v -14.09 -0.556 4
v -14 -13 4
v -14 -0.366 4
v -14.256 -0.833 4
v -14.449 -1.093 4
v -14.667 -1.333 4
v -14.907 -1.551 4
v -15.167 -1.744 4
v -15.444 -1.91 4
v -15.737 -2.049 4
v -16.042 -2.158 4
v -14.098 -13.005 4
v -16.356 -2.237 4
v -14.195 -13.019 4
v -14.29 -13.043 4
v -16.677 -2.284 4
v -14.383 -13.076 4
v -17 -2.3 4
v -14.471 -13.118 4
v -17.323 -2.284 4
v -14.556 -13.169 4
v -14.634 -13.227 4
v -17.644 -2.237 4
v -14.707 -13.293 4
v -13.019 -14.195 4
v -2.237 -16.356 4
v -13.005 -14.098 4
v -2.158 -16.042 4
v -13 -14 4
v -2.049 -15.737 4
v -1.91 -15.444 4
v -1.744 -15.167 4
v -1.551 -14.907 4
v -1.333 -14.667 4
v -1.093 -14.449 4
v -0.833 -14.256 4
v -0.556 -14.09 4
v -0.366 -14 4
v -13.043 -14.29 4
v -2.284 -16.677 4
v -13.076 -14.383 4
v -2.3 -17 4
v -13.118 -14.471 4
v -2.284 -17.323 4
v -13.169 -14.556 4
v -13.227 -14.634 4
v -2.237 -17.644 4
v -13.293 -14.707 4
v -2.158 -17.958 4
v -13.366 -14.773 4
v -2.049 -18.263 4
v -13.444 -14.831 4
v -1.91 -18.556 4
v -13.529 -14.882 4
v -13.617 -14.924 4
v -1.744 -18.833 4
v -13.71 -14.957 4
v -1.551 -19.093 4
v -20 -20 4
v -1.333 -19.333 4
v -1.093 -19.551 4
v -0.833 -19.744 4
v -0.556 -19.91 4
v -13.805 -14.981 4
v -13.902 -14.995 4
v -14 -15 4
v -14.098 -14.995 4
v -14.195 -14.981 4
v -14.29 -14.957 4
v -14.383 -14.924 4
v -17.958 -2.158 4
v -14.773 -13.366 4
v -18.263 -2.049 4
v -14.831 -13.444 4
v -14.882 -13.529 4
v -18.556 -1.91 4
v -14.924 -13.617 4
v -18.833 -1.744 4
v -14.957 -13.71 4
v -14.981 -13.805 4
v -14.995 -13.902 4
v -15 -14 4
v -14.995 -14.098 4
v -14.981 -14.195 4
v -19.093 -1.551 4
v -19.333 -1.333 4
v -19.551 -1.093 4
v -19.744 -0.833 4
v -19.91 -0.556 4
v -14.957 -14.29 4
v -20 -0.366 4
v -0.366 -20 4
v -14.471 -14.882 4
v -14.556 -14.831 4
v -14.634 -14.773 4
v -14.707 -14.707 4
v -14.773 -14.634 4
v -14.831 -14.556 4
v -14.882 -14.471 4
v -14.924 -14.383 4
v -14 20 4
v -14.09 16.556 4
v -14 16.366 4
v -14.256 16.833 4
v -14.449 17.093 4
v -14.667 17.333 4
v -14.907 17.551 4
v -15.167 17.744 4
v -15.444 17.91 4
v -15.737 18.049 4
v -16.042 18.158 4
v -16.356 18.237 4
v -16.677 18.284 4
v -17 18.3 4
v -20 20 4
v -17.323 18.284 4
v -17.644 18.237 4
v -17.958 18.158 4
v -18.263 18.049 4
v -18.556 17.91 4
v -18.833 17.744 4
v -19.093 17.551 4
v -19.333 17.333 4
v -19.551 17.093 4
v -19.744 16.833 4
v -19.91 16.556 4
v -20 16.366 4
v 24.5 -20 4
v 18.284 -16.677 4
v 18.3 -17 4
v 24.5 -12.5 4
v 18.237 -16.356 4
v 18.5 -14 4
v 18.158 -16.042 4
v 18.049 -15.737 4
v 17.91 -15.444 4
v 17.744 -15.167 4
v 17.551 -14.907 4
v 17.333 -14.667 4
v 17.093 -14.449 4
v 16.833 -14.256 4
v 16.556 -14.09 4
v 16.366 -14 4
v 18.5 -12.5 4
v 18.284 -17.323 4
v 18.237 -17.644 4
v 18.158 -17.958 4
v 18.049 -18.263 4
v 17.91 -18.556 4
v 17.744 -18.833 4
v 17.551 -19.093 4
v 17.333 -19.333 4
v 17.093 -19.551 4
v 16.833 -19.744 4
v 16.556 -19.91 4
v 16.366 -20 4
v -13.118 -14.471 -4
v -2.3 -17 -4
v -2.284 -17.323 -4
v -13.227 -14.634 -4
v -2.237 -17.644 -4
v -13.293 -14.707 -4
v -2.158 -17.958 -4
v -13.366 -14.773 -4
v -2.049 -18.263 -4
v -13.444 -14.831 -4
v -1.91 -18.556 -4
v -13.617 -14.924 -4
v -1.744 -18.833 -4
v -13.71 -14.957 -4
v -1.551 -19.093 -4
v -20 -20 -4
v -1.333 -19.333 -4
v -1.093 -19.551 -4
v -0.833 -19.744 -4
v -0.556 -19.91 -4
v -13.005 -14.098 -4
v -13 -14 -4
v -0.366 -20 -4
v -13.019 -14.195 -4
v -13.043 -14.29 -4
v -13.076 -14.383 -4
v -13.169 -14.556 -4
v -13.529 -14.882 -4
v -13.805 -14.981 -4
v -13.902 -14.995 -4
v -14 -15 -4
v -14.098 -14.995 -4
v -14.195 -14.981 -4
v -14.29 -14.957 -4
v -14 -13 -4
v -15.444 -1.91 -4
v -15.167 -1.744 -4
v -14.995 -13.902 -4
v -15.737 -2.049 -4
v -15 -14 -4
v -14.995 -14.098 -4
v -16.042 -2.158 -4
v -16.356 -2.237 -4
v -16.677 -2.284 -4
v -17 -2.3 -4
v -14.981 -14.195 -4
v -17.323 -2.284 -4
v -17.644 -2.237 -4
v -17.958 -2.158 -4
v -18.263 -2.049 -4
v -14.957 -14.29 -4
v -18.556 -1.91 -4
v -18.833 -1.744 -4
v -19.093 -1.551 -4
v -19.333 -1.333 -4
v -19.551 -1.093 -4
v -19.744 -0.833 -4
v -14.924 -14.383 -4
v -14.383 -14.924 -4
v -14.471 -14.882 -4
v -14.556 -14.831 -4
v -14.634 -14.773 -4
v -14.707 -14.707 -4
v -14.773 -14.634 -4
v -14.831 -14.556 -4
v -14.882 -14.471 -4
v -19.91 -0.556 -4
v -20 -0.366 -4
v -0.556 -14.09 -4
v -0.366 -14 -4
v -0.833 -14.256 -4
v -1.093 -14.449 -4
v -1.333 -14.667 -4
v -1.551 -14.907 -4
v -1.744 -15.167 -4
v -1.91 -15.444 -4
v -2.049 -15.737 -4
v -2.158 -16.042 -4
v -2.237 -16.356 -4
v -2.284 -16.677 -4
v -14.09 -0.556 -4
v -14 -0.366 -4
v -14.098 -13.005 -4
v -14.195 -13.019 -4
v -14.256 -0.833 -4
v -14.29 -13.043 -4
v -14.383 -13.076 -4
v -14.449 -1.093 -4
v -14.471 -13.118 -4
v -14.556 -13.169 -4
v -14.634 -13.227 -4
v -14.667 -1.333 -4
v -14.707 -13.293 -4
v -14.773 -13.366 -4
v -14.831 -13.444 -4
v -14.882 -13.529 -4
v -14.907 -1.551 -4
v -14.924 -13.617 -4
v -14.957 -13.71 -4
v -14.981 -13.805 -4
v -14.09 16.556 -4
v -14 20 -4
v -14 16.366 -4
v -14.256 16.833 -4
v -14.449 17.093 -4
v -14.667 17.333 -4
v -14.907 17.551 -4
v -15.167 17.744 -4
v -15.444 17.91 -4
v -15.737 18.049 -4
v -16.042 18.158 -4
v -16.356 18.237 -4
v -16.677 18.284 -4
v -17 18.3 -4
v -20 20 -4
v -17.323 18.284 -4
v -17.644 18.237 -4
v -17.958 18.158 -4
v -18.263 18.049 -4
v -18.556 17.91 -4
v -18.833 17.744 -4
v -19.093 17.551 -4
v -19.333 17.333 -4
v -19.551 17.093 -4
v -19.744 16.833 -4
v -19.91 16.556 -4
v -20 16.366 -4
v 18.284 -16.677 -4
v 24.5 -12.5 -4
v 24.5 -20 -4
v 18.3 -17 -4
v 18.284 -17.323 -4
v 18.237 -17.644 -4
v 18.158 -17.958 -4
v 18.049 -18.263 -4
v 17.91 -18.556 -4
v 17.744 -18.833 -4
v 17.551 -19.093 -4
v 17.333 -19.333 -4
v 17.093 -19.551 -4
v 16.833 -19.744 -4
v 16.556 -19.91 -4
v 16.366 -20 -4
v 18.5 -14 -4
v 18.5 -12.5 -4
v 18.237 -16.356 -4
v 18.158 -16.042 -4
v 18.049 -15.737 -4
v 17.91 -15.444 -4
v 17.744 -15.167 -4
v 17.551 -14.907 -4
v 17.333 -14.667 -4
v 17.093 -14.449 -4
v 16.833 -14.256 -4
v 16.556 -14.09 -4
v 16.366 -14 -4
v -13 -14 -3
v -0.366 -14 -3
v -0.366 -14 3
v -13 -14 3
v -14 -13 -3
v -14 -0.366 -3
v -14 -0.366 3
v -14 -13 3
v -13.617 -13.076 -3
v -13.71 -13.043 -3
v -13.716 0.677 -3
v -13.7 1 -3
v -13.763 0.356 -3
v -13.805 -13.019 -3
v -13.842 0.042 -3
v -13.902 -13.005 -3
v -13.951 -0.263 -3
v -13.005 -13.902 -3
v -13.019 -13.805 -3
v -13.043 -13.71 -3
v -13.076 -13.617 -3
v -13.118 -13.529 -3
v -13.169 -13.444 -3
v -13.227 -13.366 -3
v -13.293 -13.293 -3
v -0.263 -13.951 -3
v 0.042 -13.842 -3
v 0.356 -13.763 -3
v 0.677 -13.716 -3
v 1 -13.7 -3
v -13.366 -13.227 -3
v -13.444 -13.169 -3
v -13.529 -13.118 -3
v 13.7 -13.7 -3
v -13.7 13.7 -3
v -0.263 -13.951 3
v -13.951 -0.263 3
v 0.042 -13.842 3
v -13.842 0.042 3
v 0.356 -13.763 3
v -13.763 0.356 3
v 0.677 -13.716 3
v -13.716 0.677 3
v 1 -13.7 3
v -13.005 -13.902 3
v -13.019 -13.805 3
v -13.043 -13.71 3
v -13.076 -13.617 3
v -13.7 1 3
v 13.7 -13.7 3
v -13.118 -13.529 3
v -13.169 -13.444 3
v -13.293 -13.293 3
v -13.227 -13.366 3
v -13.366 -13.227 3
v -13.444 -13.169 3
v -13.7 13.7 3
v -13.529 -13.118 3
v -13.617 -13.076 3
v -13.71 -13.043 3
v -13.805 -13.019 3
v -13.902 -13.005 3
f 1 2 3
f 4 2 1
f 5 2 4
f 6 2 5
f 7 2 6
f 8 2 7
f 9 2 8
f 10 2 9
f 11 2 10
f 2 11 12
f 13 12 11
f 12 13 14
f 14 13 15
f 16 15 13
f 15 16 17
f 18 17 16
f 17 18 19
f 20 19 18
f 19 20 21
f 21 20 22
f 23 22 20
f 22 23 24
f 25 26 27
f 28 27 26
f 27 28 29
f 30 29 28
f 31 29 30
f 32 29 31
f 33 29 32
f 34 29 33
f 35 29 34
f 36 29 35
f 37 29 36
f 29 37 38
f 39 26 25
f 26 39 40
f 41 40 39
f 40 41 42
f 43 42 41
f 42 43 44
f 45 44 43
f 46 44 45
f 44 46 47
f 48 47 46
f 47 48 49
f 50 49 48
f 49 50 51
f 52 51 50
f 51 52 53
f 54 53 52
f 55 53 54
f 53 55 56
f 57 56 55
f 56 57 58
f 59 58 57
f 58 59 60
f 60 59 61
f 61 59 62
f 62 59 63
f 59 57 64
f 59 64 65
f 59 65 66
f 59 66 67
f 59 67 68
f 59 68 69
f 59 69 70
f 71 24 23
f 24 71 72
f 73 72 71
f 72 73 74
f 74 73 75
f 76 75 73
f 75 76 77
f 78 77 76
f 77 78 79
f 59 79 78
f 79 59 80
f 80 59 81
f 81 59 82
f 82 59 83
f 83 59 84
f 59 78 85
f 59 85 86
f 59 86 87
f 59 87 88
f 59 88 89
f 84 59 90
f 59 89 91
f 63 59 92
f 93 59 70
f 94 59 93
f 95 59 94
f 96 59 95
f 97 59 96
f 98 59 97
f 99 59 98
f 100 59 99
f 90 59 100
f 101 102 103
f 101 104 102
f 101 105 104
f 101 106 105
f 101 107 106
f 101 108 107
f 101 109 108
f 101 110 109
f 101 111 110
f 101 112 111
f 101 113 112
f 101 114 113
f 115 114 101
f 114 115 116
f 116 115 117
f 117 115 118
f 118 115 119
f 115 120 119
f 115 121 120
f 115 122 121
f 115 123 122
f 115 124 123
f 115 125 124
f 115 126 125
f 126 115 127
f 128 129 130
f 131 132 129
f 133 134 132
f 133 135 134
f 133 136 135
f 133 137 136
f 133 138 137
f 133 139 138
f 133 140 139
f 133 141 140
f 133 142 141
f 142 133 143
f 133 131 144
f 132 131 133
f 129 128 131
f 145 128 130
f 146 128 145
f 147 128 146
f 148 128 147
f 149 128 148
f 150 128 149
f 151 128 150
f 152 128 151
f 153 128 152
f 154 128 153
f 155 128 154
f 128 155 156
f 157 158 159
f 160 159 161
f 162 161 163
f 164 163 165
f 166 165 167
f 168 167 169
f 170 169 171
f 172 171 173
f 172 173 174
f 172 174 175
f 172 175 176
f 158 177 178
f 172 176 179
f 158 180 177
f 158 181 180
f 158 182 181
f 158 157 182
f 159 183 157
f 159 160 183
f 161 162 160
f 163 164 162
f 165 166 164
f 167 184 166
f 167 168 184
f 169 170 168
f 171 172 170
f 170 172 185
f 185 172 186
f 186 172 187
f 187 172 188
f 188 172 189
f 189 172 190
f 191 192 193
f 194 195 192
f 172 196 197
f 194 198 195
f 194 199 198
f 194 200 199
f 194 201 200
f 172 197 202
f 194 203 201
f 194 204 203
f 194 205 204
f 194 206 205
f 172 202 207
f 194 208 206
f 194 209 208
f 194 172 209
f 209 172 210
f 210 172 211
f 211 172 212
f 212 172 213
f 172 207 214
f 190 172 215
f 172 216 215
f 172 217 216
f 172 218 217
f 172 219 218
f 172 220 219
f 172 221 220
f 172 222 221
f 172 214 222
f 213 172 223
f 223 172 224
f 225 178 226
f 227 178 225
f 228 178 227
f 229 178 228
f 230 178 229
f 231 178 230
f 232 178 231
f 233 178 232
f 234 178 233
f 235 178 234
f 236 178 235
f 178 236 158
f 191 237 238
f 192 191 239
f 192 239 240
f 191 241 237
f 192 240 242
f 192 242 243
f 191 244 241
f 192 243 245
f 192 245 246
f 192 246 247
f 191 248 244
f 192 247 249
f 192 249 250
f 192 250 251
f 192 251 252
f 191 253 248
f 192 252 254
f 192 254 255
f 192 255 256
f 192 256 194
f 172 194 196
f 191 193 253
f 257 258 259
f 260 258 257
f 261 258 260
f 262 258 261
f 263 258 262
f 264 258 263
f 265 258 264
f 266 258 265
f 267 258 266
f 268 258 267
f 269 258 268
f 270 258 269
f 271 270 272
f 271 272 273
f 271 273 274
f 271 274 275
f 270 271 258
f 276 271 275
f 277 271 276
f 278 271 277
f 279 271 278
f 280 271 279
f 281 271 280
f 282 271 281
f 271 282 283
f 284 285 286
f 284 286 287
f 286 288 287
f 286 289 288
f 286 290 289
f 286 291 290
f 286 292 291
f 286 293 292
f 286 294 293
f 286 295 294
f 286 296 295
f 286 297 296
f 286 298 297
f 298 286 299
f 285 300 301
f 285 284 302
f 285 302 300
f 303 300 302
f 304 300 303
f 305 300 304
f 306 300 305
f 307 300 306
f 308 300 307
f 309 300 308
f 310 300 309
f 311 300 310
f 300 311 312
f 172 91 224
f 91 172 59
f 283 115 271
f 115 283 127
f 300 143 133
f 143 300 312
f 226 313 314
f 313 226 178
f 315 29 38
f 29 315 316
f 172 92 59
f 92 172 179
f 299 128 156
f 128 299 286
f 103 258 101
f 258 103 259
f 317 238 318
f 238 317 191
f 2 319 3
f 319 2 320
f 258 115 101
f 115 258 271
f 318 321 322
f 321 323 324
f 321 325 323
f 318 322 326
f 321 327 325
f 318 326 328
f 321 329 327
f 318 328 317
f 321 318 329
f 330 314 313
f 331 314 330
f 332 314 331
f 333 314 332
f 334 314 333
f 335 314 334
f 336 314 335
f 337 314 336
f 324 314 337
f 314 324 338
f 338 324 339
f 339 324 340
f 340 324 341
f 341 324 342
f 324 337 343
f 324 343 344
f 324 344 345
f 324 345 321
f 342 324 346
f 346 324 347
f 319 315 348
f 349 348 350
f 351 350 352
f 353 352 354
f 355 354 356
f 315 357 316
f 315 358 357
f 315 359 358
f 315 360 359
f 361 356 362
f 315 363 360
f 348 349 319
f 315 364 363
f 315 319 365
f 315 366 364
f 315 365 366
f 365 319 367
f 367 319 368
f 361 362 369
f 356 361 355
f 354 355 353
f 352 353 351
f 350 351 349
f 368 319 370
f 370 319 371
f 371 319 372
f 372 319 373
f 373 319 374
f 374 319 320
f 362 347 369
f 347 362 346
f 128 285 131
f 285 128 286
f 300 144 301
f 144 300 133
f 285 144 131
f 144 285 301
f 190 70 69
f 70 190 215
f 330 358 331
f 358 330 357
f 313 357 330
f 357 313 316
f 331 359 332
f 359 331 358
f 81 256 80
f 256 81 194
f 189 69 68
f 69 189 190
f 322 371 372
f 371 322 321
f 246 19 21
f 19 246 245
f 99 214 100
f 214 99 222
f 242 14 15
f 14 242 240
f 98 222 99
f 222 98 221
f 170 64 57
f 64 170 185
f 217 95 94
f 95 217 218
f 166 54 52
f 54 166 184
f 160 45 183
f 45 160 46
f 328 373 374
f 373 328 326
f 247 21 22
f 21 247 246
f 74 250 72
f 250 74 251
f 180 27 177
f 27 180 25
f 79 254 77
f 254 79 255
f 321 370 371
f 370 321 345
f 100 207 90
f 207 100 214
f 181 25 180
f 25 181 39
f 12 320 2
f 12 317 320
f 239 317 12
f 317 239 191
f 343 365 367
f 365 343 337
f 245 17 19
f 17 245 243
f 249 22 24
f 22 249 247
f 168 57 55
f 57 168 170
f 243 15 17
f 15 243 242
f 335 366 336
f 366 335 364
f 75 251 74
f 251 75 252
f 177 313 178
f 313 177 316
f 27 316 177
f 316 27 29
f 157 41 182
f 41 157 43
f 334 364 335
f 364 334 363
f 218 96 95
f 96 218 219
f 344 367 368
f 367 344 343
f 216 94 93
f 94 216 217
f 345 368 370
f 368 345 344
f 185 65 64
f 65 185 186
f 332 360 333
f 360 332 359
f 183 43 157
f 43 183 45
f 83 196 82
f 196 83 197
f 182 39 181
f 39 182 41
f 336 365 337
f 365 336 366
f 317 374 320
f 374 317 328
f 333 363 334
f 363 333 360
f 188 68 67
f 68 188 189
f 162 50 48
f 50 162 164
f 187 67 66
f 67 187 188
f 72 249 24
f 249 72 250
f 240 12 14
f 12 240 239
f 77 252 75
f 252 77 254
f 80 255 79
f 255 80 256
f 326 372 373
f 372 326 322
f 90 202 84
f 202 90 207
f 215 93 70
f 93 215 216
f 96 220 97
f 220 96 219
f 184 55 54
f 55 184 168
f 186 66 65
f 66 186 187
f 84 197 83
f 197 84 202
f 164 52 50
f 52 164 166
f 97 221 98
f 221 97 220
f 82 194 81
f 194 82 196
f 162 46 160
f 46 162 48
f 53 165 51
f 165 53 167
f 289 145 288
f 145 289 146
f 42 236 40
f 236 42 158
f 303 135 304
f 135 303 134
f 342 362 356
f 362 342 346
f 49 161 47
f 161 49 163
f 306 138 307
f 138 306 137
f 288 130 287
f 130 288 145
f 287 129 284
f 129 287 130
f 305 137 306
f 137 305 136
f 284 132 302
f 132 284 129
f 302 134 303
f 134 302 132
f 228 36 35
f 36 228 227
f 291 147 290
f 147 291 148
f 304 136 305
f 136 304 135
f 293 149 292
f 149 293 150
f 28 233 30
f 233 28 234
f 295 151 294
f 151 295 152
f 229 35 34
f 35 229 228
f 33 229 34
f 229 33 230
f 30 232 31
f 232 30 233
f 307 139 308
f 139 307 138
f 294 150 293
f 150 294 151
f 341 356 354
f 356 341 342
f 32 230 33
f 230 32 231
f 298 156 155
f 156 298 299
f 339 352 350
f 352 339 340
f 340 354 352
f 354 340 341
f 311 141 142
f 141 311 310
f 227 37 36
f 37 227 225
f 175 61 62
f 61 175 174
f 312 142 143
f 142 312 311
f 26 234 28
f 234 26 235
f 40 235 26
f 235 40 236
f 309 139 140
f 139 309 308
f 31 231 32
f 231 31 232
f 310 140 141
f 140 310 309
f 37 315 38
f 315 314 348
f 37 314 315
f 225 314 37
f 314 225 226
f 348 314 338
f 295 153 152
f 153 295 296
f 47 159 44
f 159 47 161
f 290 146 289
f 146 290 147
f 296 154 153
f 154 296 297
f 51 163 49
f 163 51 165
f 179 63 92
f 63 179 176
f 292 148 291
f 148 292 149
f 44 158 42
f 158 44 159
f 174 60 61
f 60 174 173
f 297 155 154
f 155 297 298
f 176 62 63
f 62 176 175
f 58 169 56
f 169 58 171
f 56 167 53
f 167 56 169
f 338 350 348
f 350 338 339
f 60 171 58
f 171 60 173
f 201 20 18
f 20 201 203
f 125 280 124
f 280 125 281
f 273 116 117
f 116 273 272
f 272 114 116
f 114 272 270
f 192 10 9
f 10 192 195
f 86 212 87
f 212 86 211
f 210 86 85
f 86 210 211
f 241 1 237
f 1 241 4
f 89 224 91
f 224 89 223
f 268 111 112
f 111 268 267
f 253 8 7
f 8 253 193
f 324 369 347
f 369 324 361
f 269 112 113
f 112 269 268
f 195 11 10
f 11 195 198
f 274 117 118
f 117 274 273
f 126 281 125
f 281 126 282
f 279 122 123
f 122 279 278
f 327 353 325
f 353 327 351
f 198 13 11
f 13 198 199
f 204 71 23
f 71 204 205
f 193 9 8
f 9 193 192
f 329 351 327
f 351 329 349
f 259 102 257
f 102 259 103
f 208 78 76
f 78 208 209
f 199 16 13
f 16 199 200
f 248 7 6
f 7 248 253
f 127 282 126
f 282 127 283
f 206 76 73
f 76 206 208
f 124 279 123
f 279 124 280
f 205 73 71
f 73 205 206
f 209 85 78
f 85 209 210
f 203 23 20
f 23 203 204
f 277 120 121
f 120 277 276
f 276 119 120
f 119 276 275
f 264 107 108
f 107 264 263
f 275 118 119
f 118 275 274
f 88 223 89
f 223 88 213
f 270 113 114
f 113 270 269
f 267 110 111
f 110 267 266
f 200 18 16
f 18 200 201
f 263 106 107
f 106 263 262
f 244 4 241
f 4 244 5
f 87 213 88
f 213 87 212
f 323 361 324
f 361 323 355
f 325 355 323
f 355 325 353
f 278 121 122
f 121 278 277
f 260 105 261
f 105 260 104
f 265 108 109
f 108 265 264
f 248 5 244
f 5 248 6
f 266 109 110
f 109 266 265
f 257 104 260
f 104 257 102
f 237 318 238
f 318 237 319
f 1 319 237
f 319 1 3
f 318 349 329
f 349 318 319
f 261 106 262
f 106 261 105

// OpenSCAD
// A extrusion bracket envelope: [40, 40, 35]
// Typical L-corner extrusion bracket: two perpendicular legs + triangular gusset + mounting slots.
// ONE connected solid. No floating parts.

$fn = 64;

// Envelope (overall bounding box)
envelope_x = 40; //[20:80:1]
envelope_y = 40; //[20:80:1]
envelope_z = 35; //[18:70:1]

// Bracket geometry
leg_thickness   = 6;      //[3:12:1]   // thickness of each leg (in X or Y)
plate_thickness = 8;      //[4:16:1]   // thickness in Z
gusset_thickness= 6;      //[3:12:1]   // thickness of triangular rib (in Z)
inner_relief    = 1.0;    //[0:3:0.1]  // small relief at inside corner

// Slots/holes
slot_width      = 6.6;    //[4:9:0.1]  // across-slot width (typical M6 clearance)
slot_length     = 14;     //[8:24:1]   // slot length
slot_edge_offset= 12;     //[6:18:1]   // distance from outer edge to slot centerline
slot_overlap    = 1;      //[0.5:2:0.1]

// Connectivity overlap (guarantees attachment between solids)
attach_overlap  = 1.5;    //[1:2:0.1]

// Helpers
function clamp(v, lo, hi) = v < lo ? lo : (v > hi ? hi : v);

module slot2d(len, wid) {
  // 2D rounded slot centered at origin, along X
  hull() {
    translate([-len/2, 0]) circle(d=wid);
    translate([ len/2, 0]) circle(d=wid);
  }
}

module extrusion_corner_bracket() {
  // Ensure parameters fit inside envelope
  lt = clamp(leg_thickness, 2, min(envelope_x, envelope_y)/2);
  pt = clamp(plate_thickness, 2, envelope_z);
  gt = clamp(gusset_thickness, 2, pt);

  // Place bracket so it occupies the +X,+Y quadrant, centered in Z
  // Overall envelope: X:[0..envelope_x], Y:[0..envelope_y], Z:[-pt/2..pt/2]
  // Then translate to center the whole envelope at origin.
  translate([-envelope_x/2, -envelope_y/2, 0]) {

    difference() {
      union() {
        // Two perpendicular legs (L shape)
        translate([0, 0, -pt/2])
          cube([envelope_x, lt, pt], center=false);

        translate([0, 0, -pt/2])
          cube([lt, envelope_y, pt], center=false);

        // Triangular gusset (rib) inside the L, centered in Z, connected to both legs
        translate([0, 0, -gt/2])
          linear_extrude(height=gt)
            polygon(points=[[0,0],[envelope_x,0],[0,envelope_y]]);

        // --- CONNECTIVITY FIX ---
        // The right-side rectangular block must be physically attached to the main body.
        // In the original, it was placed at Y=0 with depth=lt, which only touches the X-leg
        // and can appear disconnected in top/bottom views from the main bracket mass.
        //
        // Fix: make it overlap BOTH legs by spanning Y from 0..(lt+attach_overlap),
        // and overlap in X by attach_overlap. This guarantees a single connected solid.
        right_block_w = lt;                          // width in X
        right_block_d = lt + attach_overlap;         // depth in Y (overlaps into the Y-leg region)
        right_block_h = pt;                          // same Z thickness as bracket

        // Block spans:
        // X: [envelope_x - attach_overlap .. envelope_x - attach_overlap + right_block_w]
        // Y: [0 .. right_block_d]  (overlaps the corner region by attach_overlap)
        translate([envelope_x - attach_overlap, 0, -pt/2])
          cube([right_block_w, right_block_d, right_block_h], center=false);
      }

      // Inside-corner relief (small cut) to avoid sharp internal corner
      if (inner_relief > 0) {
        translate([lt, lt, 0])
          cylinder(r=inner_relief, h=pt + 2*slot_overlap, center=true);
      }

      // Two mounting slots: one on each leg, cut through Z
      sx = clamp(envelope_x - slot_edge_offset, lt + slot_length/2 + 1, envelope_x - slot_length/2 - 1);
      sy = lt/2;

      translate([sx, sy, 0])
        linear_extrude(height=pt + 2*slot_overlap, center=true)
          slot2d(slot_length, slot_width);

      tx = lt/2;
      ty = clamp(envelope_y - slot_edge_offset, lt + slot_length/2 + 1, envelope_y - slot_length/2 - 1);

      translate([tx, ty, 0])
        rotate([0,0,90])
          linear_extrude(height=pt + 2*slot_overlap, center=true)
            slot2d(slot_length, slot_width);
    }
  }
}

// Output
extrusion_corner_bracket();
